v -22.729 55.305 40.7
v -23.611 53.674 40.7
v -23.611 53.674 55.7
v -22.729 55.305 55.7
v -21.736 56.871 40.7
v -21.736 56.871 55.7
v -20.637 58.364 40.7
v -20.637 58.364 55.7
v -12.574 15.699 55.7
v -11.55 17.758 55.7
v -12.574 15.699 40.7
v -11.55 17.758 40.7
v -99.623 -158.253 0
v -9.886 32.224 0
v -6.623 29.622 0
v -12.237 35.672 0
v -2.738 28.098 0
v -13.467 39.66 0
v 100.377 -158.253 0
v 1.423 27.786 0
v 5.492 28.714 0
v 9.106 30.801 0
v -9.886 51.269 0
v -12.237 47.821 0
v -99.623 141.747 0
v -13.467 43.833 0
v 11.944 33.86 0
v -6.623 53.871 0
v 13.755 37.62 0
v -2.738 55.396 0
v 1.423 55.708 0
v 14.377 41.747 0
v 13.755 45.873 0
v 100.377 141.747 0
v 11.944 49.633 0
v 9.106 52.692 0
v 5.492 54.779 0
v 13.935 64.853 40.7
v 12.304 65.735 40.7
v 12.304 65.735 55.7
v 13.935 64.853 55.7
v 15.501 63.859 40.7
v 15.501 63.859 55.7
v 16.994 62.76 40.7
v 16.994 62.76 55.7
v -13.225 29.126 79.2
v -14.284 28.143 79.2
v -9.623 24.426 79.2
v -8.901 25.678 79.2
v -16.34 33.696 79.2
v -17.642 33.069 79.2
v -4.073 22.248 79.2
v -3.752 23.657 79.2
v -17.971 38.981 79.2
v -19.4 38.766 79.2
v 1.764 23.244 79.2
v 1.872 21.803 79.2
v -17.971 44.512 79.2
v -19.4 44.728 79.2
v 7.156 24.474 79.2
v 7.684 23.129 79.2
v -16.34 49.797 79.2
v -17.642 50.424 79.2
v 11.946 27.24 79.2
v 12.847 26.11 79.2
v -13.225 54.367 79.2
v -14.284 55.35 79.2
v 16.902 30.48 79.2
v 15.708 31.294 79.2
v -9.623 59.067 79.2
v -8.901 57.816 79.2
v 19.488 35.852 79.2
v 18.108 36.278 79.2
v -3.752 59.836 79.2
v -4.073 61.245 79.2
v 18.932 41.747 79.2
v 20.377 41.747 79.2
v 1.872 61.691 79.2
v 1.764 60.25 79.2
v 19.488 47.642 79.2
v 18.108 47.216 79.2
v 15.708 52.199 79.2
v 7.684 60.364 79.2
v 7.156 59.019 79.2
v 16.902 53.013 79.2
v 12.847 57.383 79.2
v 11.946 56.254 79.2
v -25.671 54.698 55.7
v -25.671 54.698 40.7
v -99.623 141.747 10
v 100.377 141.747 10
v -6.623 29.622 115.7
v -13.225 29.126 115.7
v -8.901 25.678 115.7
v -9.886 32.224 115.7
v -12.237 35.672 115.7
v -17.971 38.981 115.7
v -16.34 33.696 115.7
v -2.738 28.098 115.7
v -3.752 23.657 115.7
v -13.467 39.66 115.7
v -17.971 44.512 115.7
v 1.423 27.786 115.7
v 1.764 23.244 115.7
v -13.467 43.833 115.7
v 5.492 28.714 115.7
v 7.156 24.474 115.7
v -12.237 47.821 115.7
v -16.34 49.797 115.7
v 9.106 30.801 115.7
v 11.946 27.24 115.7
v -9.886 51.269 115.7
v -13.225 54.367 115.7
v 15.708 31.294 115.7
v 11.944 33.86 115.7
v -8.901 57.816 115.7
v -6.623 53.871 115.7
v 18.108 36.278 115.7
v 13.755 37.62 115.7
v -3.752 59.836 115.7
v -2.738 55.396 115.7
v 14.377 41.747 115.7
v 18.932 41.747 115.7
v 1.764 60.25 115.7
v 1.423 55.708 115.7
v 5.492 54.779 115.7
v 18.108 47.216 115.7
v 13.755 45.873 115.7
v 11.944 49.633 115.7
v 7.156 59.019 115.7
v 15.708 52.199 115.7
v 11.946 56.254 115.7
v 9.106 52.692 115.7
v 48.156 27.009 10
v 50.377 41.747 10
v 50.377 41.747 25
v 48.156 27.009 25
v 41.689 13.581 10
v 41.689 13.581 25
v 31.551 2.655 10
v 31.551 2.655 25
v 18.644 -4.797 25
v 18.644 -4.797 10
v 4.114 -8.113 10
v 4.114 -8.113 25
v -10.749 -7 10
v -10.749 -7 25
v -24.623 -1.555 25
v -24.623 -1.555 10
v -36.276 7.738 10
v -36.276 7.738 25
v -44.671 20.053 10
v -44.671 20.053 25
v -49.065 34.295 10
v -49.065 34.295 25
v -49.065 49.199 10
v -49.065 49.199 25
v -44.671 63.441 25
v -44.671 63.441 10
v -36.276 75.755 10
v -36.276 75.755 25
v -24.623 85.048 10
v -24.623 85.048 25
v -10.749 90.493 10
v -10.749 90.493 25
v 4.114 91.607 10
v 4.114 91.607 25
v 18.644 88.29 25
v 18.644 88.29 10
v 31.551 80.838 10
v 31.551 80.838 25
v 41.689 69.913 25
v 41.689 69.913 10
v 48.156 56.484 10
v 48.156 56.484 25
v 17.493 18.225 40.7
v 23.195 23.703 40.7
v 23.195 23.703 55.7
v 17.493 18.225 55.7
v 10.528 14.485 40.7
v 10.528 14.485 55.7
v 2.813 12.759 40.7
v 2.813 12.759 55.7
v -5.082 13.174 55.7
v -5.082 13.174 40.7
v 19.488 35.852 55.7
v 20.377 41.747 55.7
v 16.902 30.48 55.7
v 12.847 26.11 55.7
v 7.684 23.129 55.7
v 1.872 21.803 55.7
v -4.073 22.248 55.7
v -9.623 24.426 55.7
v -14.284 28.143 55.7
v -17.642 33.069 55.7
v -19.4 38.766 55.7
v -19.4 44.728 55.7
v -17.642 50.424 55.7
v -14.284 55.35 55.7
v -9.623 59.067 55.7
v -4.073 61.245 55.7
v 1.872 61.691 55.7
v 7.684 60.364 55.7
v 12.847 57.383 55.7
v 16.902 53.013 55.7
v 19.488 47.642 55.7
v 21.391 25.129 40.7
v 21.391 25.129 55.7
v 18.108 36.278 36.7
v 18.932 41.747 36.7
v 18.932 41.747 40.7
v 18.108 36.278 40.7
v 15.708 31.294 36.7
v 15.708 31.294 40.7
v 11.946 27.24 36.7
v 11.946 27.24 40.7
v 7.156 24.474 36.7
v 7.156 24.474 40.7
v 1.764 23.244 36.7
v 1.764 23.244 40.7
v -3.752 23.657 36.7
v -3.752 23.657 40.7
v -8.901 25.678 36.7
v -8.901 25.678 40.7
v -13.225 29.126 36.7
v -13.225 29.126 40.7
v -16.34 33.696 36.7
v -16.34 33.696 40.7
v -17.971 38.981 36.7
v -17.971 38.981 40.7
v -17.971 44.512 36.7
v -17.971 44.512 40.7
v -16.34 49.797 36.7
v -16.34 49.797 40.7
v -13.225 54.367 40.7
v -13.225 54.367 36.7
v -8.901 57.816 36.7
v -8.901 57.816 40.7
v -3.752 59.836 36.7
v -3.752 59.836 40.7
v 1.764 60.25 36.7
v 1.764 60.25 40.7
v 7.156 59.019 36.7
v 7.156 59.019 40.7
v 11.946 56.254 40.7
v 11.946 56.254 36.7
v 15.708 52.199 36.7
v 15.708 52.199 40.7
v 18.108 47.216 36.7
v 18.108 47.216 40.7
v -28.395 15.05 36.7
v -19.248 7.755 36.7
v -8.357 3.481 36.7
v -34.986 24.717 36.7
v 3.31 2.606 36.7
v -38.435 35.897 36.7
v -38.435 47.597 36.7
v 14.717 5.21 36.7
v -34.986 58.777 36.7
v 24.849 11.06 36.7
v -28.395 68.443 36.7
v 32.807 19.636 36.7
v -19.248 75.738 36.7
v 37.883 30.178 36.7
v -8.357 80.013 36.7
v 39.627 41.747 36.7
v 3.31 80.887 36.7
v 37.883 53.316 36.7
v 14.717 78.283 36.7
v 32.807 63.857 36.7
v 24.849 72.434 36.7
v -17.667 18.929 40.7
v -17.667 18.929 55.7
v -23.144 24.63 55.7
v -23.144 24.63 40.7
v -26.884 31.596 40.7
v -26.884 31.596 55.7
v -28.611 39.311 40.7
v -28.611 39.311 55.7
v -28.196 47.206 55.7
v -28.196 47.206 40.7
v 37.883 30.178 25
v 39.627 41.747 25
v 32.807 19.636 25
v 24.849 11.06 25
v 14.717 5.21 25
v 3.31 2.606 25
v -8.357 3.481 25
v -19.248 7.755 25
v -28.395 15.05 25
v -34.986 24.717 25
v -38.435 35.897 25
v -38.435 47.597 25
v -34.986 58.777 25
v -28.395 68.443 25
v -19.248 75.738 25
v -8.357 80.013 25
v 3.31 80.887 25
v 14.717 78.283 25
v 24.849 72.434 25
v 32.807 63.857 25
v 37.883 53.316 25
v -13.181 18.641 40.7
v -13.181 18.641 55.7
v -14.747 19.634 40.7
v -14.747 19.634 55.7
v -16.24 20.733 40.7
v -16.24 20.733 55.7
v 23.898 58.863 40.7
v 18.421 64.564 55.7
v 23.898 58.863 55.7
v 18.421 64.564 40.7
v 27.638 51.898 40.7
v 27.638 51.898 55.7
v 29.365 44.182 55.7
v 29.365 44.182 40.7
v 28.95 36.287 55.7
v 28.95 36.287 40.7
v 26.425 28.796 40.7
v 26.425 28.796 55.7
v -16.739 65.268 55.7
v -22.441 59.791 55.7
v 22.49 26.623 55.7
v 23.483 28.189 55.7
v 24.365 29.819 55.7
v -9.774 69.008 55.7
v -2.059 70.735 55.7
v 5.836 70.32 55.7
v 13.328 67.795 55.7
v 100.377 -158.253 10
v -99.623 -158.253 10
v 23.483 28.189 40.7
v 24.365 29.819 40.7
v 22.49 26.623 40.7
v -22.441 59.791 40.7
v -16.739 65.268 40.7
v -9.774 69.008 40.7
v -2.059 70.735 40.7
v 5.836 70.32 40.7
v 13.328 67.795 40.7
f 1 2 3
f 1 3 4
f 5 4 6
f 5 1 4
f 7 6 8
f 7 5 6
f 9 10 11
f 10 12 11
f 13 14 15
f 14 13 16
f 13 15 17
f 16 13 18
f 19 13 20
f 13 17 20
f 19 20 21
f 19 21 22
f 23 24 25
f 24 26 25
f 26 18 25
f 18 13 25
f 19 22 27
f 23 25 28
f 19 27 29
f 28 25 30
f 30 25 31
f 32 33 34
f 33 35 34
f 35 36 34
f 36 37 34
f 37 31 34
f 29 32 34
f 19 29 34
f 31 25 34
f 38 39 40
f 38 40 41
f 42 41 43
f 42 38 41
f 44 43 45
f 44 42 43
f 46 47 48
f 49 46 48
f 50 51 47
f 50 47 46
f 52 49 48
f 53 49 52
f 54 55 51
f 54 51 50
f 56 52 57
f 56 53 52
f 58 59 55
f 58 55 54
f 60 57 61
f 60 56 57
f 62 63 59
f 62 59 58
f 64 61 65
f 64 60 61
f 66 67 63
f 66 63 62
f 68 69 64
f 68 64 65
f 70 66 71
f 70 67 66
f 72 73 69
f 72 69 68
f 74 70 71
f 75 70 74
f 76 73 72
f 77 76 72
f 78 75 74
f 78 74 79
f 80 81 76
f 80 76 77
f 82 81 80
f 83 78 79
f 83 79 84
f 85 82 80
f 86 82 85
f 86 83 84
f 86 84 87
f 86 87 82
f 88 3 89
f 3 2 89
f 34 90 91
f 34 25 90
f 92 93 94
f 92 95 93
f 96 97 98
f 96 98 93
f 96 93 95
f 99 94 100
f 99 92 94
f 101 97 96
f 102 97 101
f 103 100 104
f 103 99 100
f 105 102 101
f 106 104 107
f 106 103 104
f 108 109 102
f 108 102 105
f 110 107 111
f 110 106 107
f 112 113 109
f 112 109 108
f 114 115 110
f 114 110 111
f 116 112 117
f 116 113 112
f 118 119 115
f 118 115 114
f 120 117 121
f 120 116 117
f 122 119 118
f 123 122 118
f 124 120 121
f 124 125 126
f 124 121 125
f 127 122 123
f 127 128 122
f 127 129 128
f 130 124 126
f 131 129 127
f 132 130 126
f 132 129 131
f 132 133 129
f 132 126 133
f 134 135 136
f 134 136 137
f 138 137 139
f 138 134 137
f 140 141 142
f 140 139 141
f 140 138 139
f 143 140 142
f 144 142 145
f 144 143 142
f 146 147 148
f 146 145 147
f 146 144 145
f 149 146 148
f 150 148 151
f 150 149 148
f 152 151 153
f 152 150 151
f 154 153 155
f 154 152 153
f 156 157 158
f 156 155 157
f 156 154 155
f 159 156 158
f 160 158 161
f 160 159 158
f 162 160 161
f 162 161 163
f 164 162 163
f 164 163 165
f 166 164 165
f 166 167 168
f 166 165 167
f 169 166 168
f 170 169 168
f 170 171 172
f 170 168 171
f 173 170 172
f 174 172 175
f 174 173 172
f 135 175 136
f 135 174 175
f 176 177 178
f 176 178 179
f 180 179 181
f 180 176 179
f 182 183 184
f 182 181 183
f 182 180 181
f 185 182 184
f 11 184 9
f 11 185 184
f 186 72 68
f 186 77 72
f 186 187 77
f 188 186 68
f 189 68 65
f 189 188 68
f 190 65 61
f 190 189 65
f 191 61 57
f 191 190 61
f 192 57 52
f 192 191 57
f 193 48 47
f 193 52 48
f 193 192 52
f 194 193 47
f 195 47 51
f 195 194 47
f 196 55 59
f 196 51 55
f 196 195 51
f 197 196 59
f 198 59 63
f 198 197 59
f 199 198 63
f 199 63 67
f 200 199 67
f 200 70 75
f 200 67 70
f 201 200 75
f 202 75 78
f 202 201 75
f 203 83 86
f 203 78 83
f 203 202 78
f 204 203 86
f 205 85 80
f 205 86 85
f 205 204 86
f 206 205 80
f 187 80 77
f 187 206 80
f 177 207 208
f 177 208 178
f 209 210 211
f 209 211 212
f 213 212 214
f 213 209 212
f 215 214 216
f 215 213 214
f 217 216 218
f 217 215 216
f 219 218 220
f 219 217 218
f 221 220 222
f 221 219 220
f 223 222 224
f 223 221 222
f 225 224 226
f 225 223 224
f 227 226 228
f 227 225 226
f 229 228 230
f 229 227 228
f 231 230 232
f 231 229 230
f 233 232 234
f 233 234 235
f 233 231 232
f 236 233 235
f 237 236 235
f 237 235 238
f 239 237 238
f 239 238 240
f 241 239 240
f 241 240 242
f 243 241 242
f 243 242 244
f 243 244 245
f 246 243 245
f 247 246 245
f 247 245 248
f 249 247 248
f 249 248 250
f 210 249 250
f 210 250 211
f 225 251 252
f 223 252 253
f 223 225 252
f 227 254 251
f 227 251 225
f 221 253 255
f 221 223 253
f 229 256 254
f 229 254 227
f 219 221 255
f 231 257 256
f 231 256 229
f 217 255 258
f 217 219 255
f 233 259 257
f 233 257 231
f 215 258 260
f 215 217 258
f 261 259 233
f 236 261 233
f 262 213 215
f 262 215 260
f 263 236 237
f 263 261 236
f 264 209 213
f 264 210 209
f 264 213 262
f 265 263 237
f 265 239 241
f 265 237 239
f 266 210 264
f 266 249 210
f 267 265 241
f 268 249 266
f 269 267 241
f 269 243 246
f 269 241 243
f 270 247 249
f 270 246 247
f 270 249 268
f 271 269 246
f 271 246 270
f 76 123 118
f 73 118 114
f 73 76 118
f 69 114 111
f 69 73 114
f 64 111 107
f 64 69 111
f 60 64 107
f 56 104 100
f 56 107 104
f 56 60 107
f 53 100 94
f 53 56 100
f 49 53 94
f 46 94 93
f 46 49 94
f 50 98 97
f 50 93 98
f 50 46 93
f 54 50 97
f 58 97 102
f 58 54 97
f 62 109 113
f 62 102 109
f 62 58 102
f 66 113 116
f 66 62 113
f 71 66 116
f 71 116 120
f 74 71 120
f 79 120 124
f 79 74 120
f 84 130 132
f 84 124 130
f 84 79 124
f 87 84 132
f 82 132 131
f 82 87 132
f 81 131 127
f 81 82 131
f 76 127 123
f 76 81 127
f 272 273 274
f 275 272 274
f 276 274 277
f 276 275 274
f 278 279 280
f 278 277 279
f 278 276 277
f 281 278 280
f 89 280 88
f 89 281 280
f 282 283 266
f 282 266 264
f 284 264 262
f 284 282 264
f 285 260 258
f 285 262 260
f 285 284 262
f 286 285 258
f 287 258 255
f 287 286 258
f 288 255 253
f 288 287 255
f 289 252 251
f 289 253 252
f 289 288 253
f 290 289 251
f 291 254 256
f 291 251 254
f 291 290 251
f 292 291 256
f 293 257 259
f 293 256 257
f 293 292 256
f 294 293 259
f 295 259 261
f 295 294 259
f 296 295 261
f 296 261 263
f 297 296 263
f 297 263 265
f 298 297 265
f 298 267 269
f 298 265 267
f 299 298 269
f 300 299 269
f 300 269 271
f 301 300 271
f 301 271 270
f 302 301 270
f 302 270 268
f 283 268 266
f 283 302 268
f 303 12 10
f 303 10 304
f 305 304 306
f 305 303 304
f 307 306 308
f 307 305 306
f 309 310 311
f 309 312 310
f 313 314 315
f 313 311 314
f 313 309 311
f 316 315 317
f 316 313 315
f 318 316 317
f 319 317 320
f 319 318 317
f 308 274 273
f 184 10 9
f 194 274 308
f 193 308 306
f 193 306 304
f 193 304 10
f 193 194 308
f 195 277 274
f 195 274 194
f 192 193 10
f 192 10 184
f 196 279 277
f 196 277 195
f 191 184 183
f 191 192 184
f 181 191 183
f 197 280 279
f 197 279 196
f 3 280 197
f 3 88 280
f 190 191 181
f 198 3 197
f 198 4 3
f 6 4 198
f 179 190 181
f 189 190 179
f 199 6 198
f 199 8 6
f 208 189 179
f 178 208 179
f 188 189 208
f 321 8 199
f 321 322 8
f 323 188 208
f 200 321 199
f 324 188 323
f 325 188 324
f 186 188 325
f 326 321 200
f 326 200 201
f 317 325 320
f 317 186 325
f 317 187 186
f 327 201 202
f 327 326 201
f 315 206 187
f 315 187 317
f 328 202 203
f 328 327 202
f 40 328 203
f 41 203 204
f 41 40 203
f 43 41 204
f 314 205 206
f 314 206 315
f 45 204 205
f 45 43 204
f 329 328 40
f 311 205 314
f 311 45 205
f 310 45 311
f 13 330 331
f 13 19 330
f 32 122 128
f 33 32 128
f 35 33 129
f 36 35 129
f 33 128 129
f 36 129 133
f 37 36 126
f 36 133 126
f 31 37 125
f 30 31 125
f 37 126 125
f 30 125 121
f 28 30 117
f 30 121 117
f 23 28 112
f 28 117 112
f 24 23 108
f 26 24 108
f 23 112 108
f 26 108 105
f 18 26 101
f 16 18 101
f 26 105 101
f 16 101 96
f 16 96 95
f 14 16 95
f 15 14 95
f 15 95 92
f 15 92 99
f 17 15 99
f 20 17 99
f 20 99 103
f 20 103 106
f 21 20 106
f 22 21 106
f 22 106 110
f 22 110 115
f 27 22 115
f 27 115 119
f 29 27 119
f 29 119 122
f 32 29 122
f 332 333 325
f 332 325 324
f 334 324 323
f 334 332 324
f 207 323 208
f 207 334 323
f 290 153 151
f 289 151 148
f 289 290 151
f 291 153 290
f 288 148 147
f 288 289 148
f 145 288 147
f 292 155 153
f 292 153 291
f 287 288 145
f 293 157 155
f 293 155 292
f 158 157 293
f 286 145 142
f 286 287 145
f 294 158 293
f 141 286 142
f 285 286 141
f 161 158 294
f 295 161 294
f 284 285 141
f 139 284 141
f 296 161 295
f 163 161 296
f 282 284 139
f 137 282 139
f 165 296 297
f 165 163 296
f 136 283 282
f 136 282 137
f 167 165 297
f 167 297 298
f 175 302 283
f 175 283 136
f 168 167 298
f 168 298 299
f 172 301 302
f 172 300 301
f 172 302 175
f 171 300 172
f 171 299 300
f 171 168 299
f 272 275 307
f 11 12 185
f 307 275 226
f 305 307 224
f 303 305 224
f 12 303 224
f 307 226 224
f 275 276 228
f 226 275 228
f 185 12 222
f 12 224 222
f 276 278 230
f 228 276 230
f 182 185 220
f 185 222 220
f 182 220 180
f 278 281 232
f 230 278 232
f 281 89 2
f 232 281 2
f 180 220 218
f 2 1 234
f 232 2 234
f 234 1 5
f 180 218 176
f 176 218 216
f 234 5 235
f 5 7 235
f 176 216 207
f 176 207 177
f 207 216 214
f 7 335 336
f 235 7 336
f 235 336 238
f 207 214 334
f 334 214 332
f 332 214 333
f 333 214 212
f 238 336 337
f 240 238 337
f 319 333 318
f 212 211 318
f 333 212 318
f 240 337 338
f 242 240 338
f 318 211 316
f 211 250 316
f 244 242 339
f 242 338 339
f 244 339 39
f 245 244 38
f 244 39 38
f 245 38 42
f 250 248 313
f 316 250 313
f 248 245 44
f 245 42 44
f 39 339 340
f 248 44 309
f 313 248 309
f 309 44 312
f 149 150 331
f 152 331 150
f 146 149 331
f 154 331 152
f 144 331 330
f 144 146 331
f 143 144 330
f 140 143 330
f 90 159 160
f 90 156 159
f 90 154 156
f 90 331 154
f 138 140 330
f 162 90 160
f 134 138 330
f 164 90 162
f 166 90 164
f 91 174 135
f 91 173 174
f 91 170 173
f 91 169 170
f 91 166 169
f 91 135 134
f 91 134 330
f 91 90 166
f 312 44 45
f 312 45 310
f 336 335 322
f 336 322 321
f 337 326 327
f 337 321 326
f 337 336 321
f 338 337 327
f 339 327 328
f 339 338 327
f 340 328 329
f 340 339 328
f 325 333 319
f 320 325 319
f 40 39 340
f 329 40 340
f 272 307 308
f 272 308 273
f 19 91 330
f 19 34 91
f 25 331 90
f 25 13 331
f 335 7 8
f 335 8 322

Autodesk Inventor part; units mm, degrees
ref_plane "YZ Plane" through (0, 0, 0) normal (1, 0, 0) x (0, 1, 0)
ref_plane "XZ Plane" through (0, 0, 0) normal (0, 1, 0) x (-1, 0, 0)
sketch "Sketch1" plane through (0, 0, 0) normal (0, 0, 1) x (1, 0, 0)
  line L0 (-99.623, 141.7467) -> (100.377, 141.7467)
  line L1 (100.377, 141.7467) -> (100.377, -158.2533)
  line L2 (100.377, -158.2533) -> (-99.623, -158.2533)
  line L3 (-99.623, -158.2533) -> (-99.623, 141.7467)
  point P0 (0, 0)
  dimension "d0" = 200
  dimension "d1" = 300
extrude "Extrusion1" add sketch "Sketch1" along normal blind 10
sketch "Sketch2" plane through (0, 0, 10) normal (0, 0, 1) x (1, 0, 0)
  circle A0 centre (0.377, 41.7467) radius 50
  line L0 (100.377, 141.7467) -> (-99.623, 141.7467) projected
  line L1 (100.377, -158.2533) -> (100.377, 141.7467) projected
  point P0 (0, 0)
  dimension "d4" = 100
  dimension "d5" = 100
  dimension "d6" = 100
extrude "Extrusion2" add sketch "Sketch2" along normal blind 15
sketch "Sketch3" plane through (0.377, 41.7467, 25) normal (0, 0, 1) x (1, 0, 0)
  circle A0 centre (0, 0) radius 39.25
  point P0 (-0.377, -41.7467)
  dimension "d9" = 78.5
extrude "Extrusion3" add sketch "Sketch3" along normal blind 11.7
sketch "Sketch4" plane through (0.377, 41.7467, 36.7) normal (0, 0, 1) x (1, 0, 0)
  circle A0 centre (0, 0) radius 18.555
  point P0 (-0.377, -41.7467)
  dimension "d12" = 37.11
extrude "Extrusion4" add sketch "Sketch4" along normal blind 79
ref_plane "Work Plane1" through (0.377, 41.7467, 40.7) normal (0, 0, 1) x (1, 0, 0)
sketch "Sketch5" plane through (0.377, 41.7467, 40.7) normal (0, 0, 1) x (1, 0, 0)
  circle A0 centre (0, 0) radius 18.555 projected
  circle A1 centre (0, 0) radius 29.09
  circle A2 centre (0, 0) radius 26.79
  line L0 (0, 0) -> (12.9512, 26.0479)
  line L1 (0, 0) -> (18.044, 22.8176)
  line L2 (0, 0) -> (-26.0479, 12.9512)
  line L3 (0, 0) -> (-22.8176, 18.044)
  line L4 (0, 0) -> (-12.9512, -26.0479)
  line L5 (0, 0) -> (-18.044, -22.8176)
  line L6 (0, 0) -> (26.0479, -12.9512)
  line L7 (0, 0) -> (22.8176, -18.044)
  point P0 (-0.377, -41.7467)
  point P1 (-23.9885, 11.9272)
  point P2 (-18.044, -22.8176)
  point P3 (-16.6174, -21.0135)
  point P4 (-11.9272, -23.9885)
  point P5 (22.8176, -18.044)
  point P6 (21.0135, -16.6174)
  point P7 (23.9885, -11.9272)
  point P8 (26.0479, -12.9512)
  point P9 (16.6174, 21.0135)
  point P10 (11.9272, 23.9885)
  point P11 (-21.0135, 16.6174)
  dimension "d16" = 58.18
  dimension "d19" = 53.58
  dimension "d20" = 11.9
  dimension "d23" = 360
extrude "Extrusion5" add sketch "Sketch5" along normal blind 15 contours A0 L1 A2 L6 | A0 L0 A2 L1 | L6 A2 L7 A0 | A0 L3 A2 L0 | L1 A1 L6 A2 | L7 A2 L4 A0 | A0 L2 A2 L3 | A2 L3 A1 L0 | A0 L5 A2 L2 | L4 A2 L5 A0 | L7 A1 L4 A2 | A2 L5 A1 L2
sketch "Sketch6" plane through (0.377, 41.7467, 115.7) normal (0, 0, 1) x (1, 0, 0)
  circle A0 centre (0, 0) radius 14
  point P0 (-0.377, -41.7467)
  dimension "d25" = 28
extrude "Extrusion6" cut sketch "Sketch6" against normal through all
sketch "Sketch7" plane through (0.377, 41.7467, 55.7) normal (0, 0, 1) x (1, 0, 0)
  circle A0 centre (0, 0) radius 14
  circle A1 centre (0, 0) radius 20
  point P0 (-0.377, -41.7467)
  dimension "d28" = 40
extrude "Extrusion7" add sketch "Sketch7" along normal blind 23.5
thread "Thread1" size "M40x3" class "6g" standard "ANSI Metric M Profile" full length
properties part number "lathe_spindle_end"
